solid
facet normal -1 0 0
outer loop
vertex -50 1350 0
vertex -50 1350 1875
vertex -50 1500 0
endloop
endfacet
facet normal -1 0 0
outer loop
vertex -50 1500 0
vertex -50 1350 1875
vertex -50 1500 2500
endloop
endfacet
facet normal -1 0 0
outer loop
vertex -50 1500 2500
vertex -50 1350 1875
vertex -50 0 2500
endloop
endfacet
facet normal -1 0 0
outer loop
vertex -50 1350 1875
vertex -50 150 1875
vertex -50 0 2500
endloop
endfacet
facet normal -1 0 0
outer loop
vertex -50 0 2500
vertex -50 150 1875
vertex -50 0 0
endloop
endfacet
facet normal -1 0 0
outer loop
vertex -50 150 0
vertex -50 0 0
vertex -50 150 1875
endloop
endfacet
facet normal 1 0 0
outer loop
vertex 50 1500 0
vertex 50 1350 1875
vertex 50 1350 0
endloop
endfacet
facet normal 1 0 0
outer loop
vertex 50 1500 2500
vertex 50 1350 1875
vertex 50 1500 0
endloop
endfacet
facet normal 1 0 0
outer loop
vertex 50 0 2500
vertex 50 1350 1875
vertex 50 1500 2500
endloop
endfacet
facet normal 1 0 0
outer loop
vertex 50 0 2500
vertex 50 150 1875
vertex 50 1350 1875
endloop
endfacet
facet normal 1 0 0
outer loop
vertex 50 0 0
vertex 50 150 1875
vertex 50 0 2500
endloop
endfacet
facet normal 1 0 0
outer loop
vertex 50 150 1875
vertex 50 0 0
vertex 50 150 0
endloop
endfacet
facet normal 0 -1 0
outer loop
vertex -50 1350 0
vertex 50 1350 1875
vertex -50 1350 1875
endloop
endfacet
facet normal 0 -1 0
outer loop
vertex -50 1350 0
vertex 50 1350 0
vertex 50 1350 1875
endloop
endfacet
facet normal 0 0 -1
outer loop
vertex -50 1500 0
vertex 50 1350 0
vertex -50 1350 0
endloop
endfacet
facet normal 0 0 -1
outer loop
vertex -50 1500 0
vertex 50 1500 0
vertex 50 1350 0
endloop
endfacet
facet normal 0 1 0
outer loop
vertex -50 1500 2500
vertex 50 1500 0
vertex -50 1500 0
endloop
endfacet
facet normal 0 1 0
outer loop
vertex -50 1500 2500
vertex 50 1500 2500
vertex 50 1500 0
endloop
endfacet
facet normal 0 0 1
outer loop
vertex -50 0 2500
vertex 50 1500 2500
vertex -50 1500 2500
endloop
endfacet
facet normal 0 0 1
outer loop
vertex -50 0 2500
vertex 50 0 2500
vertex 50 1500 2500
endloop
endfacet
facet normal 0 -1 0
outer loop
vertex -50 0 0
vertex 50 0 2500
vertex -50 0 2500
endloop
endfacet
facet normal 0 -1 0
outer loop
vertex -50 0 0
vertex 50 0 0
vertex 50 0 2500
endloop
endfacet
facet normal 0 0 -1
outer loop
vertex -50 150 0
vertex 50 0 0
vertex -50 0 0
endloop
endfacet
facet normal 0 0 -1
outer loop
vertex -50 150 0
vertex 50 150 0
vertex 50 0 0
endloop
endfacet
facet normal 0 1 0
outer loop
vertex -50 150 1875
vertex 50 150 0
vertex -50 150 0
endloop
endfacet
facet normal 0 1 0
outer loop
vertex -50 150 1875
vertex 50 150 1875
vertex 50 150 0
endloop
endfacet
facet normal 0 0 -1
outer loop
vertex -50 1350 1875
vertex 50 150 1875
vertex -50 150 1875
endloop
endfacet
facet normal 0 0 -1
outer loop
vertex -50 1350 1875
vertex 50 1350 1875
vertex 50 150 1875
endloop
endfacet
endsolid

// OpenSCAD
// file: modifiers/diagonalize.scad
include <../templates/basic-dims.scad>

module diagonalize_triangle_sketch(t = section_thickness) {
    x = sin(45) * t;
    y = cos(45) * t;

    polygon([
        [0, y],
        [x, 0],
        [0, -y]
    ]);
}

module diagonalize_triangle(t = section_thickness) {
    rotate([0, 0, 90])
    linear_extrude(section_height)
    diagonalize_triangle_sketch(t);
}

module diagonalize2D() {
    thickness = section_thickness / rt;

    trans = (section_thickness/2)*rt/2;
    len_scale = rt - section_thickness / (rt * section_width);

    rotate([0, 0, 45])
    translate([trans, 0, 0])
    scale([len_scale, 1/rt, 1])
    children();
}


module diagonalize3D(w = section_width, t = section_thickness, edges = "trans") {

    trans = (t/2)*rt/2;
    len_scale = rt - t / (rt * w);

    edge_angle = edges == "cis" ? 270 : 180;
    
    diagonalize_triangle(t/rt);

    translate([-w, w, 0])
    rotate([0, 0, edge_angle]) // 180 For continue, -90 (270) for end
    diagonalize_triangle(t/rt);

    rotate([0, 0, 45])
    translate([0, trans, 0])
    scale([1/rt, len_scale, 1])
    children();
}
// file: templates/basic-dims.scad
unit = 1000;

section_width = unit * 1.5;
section_height = unit * 2.5;
section_thickness = unit * 0.1;

rt = sqrt(2);

//  -- Notes --
//  Z is UP
//  X is FORWARD (out of the screen)
// main file
include <./templates/basic-dims.scad>
include <./modifiers/diagonalize.scad>
door_width = section_width * 0.8;
door_height = section_height * 0.75;

wall_thickness = section_thickness;

module door_piece_sketch() {
    difference() {
        square([section_width, section_height]);

        translate([section_width/2 - door_width/2, 0, 0])
        square([door_width, door_height]);
    }   
}

module door_piece() {
    rotate([90, 0, 90])
    translate([0, 0, -wall_thickness/2])
    linear_extrude(wall_thickness)
    door_piece_sketch();
}

door_piece();
